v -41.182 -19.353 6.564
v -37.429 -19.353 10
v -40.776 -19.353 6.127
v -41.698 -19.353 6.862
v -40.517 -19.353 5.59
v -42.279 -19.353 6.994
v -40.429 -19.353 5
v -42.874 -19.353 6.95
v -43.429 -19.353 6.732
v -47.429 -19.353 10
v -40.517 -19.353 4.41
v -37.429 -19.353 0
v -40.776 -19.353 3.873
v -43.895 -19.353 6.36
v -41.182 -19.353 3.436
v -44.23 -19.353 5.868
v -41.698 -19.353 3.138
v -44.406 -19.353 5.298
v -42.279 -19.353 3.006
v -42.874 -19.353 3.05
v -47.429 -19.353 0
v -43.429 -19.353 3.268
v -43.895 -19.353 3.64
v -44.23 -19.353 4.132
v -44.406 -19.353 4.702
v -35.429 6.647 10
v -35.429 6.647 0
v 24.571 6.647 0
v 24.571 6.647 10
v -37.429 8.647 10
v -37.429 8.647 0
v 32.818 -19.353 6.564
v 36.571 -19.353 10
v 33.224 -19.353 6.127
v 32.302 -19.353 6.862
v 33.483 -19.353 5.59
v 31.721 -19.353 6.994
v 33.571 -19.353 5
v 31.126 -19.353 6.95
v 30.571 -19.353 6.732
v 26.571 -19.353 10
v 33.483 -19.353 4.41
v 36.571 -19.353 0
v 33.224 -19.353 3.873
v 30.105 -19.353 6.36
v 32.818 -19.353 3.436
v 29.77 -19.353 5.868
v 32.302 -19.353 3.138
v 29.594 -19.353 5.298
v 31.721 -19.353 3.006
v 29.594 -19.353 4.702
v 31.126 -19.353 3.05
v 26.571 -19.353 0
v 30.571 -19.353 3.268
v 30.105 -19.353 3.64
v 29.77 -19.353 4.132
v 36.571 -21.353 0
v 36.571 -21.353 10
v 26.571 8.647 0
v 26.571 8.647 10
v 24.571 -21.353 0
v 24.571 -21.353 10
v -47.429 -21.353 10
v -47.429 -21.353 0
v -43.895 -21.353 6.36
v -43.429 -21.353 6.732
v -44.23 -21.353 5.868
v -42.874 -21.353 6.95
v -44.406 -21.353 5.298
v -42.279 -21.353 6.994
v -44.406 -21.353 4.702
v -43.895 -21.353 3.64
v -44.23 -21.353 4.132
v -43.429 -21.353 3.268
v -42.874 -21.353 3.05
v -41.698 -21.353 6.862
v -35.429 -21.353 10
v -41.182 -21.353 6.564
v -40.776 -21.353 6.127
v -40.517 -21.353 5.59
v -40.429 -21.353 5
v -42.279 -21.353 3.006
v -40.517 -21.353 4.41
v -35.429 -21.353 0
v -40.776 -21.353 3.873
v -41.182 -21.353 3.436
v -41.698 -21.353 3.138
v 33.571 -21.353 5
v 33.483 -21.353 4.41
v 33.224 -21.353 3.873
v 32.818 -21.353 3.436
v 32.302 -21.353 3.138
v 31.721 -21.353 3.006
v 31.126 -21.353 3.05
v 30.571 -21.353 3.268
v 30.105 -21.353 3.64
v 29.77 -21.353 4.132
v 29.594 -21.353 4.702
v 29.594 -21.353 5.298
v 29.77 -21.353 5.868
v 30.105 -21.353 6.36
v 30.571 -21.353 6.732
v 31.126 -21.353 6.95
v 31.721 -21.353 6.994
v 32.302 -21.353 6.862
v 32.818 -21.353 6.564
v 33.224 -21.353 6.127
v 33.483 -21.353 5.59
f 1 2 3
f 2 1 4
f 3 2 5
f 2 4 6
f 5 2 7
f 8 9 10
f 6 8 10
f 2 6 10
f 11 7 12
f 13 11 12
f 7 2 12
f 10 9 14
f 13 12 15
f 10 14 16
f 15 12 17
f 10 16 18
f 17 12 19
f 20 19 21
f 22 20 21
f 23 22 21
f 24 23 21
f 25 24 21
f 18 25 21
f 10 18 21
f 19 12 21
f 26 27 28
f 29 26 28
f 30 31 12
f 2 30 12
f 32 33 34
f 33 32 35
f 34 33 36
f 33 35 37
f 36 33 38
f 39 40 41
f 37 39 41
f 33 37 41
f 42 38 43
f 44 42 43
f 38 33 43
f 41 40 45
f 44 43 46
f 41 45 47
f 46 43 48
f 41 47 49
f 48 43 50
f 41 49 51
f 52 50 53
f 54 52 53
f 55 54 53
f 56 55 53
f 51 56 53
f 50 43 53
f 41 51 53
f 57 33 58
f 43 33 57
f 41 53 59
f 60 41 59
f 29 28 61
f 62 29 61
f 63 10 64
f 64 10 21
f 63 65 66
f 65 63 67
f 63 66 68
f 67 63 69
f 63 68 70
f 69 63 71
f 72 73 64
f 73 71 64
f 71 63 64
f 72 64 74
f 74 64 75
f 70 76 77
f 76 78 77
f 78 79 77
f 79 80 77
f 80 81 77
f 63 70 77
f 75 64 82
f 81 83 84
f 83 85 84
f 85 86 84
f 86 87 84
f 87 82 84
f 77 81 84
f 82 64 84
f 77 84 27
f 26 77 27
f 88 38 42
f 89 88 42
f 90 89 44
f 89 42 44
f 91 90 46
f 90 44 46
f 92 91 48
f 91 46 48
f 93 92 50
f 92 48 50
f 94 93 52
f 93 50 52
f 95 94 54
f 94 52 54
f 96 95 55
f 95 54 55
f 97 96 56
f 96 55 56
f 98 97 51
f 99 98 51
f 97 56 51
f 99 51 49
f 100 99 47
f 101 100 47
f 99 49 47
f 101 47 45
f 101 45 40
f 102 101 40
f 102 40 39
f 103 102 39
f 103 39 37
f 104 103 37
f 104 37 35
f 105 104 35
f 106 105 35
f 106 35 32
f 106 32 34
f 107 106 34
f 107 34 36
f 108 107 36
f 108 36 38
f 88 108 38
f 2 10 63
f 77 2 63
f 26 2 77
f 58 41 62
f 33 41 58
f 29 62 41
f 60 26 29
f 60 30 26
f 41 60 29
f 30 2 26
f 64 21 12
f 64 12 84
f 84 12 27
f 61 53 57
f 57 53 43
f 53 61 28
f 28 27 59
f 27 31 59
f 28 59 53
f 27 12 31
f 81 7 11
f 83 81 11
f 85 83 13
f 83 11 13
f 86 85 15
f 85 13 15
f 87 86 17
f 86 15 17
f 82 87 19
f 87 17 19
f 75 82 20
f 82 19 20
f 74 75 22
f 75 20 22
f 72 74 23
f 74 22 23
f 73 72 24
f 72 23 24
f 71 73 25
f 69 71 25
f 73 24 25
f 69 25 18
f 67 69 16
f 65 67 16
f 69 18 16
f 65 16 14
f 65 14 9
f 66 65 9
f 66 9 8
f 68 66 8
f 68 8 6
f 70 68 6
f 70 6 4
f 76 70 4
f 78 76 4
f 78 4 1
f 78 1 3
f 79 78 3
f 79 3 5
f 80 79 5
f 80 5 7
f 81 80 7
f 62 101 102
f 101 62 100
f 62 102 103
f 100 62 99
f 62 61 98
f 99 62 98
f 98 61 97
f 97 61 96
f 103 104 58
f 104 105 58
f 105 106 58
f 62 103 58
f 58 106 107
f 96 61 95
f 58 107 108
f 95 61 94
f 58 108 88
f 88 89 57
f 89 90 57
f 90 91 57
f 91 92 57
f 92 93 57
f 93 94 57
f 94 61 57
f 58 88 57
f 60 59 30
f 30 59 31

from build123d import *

# Parameters (mm, degrees)
BOSS_EXTRUDE1_DEPTH = 10
SKETCH2_R           = 2
CUT_EXTRUDE2_DEPTH  = 10
SKETCH3_W           = 10
SKETCH3_H           = 10
CUT_EXTRUDE3_DEPTH  = 10


with BuildPart() as part:
    # Sketch1 → Boss-Extrude1 (new body)
    with BuildSketch(Plane.XY):
        Polygon((-57.4285121, -21.353337692), (-37.4285121, -21.353337692), (-35.4285121, -21.353337692), (-35.4285121, 6.646662308), (24.5714879, 6.646662308), (24.5714879, -21.353337692), (26.5714879, -21.353337692), (46.5714879, -21.353337692), (46.5714879, -19.353337692), (26.5714879, -19.353337692), (26.5714879, 8.646662308), (24.5714879, 8.646662308), (-35.4285121, 8.646662308), (-37.4285121, 8.646662308), (-37.4285121, -19.353337692), (-57.4285121, -19.353337692), align=None)
    extrude(amount=BOSS_EXTRUDE1_DEPTH)

    # Sketch2 → Cut-Extrude2 (cut)
    with BuildSketch(Plane(origin=(0, -19.353337692, 0), x_dir=(1, 0, 0), z_dir=(0, 1, 0))):
        with Locations((-42.4285121, -5)):
            Circle(SKETCH2_R)
        with Locations((31.5714879, -5)):
            Circle(SKETCH2_R)
    extrude(amount=-CUT_EXTRUDE2_DEPTH, mode=Mode.SUBTRACT)

    # Sketch3 → Cut-Extrude3 (cut)
    with BuildSketch(Plane(origin=(0, -19.353337692, 0), x_dir=(1, 0, 0), z_dir=(0, 1, 0))):
        with Locations((-52.4285121, -5)):
            Rectangle(SKETCH3_W, SKETCH3_H)
        with Locations((41.5714879, -5)):
            Rectangle(SKETCH3_W, SKETCH3_H)
    extrude(amount=-CUT_EXTRUDE3_DEPTH, mode=Mode.SUBTRACT)


solid = part.part
